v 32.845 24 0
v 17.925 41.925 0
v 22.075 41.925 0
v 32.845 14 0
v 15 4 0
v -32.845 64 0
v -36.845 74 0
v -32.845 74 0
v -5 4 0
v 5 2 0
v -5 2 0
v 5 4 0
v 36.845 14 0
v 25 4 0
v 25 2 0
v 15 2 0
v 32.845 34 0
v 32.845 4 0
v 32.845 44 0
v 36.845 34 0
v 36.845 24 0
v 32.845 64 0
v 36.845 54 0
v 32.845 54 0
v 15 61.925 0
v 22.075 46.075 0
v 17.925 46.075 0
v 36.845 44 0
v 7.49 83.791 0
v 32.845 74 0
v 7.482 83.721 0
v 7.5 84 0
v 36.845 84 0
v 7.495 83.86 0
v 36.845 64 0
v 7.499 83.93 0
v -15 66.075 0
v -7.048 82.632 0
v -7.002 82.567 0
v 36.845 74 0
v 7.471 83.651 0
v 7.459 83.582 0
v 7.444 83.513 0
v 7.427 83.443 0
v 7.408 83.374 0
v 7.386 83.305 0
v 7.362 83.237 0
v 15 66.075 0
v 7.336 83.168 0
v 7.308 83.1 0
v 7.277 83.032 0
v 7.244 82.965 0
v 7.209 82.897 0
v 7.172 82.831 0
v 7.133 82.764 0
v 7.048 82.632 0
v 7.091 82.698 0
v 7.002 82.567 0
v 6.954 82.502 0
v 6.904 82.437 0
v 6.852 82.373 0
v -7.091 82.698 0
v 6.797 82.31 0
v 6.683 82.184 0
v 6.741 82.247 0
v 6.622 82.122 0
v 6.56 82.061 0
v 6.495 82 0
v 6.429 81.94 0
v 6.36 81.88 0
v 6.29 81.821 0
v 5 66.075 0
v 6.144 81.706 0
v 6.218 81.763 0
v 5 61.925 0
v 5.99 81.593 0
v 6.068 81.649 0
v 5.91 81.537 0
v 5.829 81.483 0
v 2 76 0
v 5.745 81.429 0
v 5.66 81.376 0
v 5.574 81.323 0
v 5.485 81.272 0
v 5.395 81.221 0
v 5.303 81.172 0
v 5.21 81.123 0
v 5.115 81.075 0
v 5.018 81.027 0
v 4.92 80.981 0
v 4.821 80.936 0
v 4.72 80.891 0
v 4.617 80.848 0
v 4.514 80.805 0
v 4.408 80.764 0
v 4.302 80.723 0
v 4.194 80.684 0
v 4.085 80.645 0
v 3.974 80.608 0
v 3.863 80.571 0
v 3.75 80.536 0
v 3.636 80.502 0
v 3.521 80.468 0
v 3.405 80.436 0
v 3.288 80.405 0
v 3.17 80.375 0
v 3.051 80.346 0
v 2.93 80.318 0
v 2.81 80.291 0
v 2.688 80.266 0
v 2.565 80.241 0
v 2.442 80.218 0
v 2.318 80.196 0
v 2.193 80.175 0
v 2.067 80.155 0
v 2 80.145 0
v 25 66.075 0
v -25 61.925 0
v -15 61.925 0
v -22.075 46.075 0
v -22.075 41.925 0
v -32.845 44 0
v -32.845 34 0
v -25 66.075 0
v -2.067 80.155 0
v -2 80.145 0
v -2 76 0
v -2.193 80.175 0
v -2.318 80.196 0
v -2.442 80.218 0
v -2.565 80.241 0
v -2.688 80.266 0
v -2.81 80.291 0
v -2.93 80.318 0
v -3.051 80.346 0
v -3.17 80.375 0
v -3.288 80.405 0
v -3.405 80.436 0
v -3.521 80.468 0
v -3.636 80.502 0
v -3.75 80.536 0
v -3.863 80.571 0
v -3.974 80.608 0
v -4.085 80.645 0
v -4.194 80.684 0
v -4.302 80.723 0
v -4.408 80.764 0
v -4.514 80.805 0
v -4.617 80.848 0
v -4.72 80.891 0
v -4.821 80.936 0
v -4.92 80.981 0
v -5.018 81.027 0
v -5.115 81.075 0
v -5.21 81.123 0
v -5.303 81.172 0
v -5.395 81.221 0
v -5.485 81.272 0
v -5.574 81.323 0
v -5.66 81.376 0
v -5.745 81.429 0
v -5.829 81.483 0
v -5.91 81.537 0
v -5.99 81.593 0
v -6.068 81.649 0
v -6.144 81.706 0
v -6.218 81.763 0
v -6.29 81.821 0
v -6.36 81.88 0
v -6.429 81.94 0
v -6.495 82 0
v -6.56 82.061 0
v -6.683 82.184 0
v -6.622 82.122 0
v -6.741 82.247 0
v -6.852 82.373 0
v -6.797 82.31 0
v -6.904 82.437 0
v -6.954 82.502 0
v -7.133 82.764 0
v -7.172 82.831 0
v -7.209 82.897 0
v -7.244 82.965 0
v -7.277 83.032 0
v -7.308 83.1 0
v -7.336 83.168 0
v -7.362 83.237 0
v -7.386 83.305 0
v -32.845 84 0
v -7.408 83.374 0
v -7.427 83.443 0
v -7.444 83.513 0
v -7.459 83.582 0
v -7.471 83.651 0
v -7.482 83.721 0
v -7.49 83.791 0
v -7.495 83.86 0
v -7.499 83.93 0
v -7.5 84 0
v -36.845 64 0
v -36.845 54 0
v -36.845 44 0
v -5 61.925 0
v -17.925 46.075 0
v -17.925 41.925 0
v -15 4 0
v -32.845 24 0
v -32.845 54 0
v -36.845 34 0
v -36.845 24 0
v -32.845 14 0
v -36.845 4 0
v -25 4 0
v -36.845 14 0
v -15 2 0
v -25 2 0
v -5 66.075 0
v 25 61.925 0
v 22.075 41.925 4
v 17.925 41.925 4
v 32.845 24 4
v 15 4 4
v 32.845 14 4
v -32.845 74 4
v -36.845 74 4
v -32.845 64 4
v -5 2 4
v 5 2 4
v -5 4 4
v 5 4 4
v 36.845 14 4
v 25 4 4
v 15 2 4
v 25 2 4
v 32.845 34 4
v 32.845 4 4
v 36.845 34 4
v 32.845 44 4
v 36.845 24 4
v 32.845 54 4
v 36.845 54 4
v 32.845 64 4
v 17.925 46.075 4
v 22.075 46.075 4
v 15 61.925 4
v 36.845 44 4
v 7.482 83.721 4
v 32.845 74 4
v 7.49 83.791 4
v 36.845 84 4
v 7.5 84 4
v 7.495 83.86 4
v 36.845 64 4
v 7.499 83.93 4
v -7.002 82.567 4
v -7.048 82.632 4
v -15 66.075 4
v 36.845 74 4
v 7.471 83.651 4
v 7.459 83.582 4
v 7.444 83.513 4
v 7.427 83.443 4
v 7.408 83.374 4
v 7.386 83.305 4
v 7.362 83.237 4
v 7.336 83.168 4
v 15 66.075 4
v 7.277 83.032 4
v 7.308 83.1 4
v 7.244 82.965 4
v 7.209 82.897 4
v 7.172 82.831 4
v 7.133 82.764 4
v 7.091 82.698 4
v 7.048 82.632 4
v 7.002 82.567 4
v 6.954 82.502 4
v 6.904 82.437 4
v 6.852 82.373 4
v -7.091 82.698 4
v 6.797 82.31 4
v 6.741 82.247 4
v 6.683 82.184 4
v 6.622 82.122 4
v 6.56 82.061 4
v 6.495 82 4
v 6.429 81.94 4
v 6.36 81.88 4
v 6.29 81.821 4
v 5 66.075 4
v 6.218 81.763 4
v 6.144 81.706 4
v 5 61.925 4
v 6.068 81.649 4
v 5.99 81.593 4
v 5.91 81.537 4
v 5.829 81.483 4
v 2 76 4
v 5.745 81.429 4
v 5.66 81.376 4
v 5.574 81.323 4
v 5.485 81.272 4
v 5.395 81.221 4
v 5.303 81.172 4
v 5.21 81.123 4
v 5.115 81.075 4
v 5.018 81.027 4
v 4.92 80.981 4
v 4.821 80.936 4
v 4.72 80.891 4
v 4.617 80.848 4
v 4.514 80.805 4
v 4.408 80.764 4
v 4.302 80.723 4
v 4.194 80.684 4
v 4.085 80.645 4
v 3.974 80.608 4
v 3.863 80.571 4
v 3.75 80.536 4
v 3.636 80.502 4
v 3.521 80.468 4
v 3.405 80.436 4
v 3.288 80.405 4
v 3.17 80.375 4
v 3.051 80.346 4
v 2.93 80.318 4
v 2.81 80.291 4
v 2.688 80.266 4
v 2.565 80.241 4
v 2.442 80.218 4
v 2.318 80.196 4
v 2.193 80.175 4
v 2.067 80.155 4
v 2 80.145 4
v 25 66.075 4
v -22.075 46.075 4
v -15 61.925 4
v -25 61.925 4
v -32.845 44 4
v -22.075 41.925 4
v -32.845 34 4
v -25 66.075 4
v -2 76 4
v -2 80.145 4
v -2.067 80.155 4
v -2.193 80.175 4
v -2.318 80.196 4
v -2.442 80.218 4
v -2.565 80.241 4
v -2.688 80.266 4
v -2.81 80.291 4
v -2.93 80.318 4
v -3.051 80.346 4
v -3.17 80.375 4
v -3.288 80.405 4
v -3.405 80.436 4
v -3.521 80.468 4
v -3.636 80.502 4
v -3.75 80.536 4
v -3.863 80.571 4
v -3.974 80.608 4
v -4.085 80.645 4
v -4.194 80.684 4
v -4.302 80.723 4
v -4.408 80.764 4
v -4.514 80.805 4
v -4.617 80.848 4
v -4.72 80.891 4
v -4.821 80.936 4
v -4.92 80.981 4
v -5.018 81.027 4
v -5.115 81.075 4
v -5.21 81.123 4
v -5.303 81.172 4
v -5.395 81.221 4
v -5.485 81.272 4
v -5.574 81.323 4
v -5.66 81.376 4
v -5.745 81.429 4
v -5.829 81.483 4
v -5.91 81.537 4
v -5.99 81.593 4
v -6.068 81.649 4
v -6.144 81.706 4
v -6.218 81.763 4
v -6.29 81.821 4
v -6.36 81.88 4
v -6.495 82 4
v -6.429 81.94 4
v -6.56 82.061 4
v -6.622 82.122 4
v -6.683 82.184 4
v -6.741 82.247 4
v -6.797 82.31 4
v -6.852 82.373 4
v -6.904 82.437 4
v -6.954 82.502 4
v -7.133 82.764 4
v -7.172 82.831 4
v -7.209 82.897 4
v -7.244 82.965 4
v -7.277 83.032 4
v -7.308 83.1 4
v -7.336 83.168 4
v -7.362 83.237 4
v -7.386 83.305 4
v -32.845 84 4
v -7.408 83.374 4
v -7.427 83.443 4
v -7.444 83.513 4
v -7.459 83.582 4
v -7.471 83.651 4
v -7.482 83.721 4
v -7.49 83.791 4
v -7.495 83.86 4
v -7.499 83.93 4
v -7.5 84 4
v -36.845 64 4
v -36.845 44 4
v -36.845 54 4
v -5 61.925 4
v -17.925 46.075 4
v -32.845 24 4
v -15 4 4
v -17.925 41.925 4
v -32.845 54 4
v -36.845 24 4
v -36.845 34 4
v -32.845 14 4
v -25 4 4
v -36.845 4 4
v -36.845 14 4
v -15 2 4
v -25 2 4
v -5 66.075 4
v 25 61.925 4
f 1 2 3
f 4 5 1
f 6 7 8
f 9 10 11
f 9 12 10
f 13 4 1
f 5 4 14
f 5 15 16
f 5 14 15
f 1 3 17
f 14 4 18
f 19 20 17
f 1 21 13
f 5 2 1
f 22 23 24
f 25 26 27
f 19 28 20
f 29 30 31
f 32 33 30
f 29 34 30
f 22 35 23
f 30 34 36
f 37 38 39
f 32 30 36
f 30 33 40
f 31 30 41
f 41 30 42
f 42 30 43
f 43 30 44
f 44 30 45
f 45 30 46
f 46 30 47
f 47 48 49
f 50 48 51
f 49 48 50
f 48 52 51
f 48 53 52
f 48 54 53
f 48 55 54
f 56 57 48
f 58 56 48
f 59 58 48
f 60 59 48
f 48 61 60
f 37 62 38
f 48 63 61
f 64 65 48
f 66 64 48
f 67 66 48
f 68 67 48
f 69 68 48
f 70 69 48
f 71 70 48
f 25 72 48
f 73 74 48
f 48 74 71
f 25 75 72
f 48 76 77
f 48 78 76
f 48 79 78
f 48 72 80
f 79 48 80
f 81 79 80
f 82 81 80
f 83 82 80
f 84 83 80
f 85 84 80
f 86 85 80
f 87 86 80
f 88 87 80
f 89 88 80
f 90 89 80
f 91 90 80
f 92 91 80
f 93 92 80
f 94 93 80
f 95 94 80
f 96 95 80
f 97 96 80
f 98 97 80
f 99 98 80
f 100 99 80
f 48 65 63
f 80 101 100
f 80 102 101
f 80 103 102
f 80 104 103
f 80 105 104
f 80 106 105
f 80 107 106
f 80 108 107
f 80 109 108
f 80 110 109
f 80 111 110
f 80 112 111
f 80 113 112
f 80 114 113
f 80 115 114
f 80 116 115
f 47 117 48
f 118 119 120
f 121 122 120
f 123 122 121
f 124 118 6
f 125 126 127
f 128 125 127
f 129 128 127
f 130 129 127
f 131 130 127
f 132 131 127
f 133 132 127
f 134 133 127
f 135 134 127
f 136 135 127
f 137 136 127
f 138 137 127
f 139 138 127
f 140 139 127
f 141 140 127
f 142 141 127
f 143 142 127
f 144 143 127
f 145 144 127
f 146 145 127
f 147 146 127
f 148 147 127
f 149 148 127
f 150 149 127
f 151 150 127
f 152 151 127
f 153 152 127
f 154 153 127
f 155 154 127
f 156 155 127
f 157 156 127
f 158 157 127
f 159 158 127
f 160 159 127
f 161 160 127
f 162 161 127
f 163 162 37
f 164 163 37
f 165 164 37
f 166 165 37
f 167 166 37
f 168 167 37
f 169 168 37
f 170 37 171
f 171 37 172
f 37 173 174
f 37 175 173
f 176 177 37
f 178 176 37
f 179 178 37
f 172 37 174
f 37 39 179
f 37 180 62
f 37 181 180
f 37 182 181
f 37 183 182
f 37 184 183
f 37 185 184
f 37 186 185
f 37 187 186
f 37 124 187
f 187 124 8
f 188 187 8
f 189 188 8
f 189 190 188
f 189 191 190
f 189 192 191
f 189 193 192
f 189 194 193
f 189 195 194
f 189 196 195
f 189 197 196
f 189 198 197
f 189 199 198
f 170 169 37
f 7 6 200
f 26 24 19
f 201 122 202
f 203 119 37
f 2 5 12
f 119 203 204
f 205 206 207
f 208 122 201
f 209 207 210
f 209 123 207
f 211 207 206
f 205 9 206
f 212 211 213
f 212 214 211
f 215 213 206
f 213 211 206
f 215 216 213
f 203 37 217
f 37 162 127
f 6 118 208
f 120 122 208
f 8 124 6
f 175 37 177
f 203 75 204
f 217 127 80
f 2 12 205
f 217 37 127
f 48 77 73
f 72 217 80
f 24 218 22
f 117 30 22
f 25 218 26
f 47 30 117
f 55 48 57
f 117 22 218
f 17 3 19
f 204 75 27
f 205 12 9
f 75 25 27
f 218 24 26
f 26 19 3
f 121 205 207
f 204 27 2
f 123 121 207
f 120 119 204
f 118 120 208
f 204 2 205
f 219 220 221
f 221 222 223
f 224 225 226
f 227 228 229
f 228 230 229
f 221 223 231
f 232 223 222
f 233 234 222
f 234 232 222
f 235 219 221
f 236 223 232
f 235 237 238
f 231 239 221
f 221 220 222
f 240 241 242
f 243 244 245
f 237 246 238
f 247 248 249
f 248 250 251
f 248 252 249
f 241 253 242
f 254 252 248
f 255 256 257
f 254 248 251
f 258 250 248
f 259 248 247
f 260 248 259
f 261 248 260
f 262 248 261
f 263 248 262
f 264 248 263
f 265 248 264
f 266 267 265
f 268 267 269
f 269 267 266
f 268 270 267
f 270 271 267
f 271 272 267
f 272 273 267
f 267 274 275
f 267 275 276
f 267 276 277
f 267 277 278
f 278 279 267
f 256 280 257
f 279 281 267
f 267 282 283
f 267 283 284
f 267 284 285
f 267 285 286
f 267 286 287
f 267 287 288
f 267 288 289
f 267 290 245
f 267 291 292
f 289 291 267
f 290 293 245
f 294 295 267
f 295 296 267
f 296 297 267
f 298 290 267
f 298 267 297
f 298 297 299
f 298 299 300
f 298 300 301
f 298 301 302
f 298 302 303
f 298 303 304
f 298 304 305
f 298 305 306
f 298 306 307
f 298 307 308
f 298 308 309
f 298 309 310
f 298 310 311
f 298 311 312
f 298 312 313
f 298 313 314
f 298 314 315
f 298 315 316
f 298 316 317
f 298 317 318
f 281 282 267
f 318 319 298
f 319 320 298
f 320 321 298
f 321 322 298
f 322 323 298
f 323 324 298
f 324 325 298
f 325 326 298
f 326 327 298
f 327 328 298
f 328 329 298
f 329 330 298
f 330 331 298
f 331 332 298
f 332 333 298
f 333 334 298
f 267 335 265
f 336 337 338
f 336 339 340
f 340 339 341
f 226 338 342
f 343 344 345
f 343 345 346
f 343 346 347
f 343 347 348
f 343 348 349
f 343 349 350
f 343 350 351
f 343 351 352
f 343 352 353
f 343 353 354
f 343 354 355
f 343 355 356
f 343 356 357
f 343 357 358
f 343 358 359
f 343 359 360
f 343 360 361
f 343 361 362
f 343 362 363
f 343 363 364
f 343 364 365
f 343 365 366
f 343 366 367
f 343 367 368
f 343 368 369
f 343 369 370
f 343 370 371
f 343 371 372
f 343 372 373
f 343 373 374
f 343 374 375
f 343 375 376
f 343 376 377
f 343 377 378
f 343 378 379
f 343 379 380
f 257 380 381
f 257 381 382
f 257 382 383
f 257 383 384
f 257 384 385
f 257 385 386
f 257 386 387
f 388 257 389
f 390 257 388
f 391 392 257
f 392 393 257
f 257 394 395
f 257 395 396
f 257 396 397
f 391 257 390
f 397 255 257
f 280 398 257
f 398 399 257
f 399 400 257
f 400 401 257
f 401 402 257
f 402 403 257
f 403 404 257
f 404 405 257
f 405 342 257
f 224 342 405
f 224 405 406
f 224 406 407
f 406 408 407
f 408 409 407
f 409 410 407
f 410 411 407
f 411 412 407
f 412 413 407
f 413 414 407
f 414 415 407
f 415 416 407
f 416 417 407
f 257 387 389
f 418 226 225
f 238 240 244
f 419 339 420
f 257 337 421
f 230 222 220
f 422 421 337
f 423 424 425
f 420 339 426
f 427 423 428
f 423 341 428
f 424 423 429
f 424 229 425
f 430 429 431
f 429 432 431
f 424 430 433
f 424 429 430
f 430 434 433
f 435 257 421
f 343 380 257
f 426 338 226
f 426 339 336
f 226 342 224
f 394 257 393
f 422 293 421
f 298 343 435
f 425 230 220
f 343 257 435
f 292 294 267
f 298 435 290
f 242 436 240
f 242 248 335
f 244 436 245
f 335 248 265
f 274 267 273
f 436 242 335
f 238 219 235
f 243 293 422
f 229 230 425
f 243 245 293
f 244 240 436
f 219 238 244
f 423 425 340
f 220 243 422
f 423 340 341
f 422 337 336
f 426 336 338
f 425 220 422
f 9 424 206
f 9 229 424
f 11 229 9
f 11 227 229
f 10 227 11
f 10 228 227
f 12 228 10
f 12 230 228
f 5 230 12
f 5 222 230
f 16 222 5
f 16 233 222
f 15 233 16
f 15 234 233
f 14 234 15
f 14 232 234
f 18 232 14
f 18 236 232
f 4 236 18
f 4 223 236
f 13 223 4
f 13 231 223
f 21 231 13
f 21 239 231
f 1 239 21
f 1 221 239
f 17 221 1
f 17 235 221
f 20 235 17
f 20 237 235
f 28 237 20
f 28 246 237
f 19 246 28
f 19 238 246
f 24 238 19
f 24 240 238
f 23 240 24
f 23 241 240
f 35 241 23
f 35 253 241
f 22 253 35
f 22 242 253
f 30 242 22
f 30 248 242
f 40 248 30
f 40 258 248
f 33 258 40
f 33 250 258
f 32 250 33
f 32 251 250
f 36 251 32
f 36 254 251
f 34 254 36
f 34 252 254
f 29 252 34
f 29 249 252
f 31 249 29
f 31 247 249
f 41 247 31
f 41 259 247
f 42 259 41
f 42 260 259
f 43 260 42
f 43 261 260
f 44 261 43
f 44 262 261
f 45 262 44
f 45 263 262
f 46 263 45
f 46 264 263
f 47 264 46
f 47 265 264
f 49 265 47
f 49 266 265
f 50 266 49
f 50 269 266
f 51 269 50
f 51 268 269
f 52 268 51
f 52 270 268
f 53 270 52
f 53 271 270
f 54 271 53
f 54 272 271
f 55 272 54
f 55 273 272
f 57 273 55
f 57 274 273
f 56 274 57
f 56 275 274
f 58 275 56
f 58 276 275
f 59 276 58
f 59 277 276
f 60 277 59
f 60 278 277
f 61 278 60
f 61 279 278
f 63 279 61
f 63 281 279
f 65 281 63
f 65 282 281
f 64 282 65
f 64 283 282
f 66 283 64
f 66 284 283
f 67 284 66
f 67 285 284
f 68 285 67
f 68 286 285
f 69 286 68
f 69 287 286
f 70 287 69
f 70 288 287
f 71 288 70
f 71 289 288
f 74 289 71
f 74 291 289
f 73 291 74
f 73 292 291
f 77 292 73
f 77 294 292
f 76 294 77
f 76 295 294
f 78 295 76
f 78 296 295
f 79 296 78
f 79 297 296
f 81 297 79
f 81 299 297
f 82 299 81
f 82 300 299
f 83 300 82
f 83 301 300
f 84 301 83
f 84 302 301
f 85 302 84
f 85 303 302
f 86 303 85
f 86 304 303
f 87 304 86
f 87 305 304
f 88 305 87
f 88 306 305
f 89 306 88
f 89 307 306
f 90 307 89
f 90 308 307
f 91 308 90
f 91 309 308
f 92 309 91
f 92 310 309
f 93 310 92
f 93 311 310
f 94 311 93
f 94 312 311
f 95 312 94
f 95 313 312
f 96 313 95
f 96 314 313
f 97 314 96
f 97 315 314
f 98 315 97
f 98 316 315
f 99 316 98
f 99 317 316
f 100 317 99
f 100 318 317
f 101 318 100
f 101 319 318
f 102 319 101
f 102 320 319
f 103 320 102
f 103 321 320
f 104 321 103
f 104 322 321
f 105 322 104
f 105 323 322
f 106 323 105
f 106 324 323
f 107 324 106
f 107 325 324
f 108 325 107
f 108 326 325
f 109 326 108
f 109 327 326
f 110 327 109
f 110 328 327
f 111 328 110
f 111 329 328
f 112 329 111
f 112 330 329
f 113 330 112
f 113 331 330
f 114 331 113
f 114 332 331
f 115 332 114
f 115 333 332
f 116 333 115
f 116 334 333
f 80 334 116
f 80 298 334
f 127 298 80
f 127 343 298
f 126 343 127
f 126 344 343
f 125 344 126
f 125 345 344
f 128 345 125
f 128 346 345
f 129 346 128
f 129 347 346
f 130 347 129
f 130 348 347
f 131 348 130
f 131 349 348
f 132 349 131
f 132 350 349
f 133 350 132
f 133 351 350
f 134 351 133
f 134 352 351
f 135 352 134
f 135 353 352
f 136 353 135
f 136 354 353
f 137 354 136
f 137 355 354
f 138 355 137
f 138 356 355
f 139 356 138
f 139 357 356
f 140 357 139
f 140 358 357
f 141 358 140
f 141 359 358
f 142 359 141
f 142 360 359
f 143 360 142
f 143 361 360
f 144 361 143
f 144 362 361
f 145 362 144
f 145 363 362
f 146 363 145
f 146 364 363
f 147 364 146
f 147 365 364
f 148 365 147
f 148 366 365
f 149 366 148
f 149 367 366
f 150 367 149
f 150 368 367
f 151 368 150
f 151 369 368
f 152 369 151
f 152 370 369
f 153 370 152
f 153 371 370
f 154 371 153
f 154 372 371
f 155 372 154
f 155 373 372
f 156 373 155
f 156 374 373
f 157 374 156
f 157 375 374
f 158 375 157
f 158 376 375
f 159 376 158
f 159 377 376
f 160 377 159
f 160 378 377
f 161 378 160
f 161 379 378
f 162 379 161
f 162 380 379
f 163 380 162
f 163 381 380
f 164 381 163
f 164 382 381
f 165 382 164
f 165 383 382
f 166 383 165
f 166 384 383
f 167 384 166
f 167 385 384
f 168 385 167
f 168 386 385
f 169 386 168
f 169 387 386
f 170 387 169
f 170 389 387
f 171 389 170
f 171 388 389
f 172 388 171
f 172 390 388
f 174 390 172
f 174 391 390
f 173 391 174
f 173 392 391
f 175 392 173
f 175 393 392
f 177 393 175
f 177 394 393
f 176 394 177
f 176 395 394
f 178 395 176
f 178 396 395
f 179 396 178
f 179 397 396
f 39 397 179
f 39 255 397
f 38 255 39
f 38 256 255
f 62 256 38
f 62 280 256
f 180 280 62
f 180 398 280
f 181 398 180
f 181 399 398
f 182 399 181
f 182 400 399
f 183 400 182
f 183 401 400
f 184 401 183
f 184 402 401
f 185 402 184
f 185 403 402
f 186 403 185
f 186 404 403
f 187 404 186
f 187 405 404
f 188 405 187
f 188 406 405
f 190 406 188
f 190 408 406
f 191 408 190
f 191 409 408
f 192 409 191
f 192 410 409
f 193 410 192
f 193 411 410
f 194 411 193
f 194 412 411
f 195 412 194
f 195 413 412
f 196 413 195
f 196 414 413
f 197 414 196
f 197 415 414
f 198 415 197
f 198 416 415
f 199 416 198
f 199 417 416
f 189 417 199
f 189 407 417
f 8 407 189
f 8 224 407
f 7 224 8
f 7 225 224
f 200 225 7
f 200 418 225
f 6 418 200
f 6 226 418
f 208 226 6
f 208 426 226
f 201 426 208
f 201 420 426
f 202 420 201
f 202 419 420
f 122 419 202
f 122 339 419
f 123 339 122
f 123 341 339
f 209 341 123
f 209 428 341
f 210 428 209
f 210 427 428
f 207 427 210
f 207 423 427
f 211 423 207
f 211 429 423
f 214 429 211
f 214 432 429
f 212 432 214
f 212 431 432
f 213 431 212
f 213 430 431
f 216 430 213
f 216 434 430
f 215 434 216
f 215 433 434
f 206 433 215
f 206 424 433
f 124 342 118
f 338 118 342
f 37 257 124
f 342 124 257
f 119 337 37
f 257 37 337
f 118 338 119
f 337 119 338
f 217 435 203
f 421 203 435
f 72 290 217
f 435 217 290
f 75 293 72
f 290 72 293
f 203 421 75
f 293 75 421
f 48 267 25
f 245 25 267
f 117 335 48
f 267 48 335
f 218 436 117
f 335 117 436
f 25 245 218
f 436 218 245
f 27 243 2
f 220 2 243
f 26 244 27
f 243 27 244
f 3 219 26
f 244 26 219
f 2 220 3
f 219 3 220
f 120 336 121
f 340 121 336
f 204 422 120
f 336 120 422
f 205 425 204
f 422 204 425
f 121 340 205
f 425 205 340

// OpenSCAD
/* 
 * Stackenlichten-Files I: The top plate
 *
 * kellertuer, 2017-02-19
 * int2k, 2018-01-01 Added tolerances to the Centerfittings
 *
 * todo:
 * rewrite (nice!) recursion with tolerances also added on sides
 */

/*
 * Variables, all Data in mm
 */
wW = 4;    // Thickness/Width of wood
mW = 4;    //                 of a Magnet-Cube
tol = .15;  // Tolerances for the Fitting with the centerpiece
fW = 2;    // Thickness of the front plastic plate
sL = 80;   // sidelength of a triangle
bD = 80;   // Depth of a box (depth w.r.t. frontview)
fC = 3;    // number of fingers in the triangle (odd)
fD = 4;    // number on fingers downwards (even)
eW = 15; //ellipseWidth (longer arc)
// don't change these values
nC = 2*fC+2; //number of Divisions, due to 2fC+1 segments anC one segment that split in the corners
nD = 2*fD;
shortenSide = wW/tan(60)+wW/sin(90);
// concat with shfted rotated versions... bottom left right

//Generate one side

translate([0,wW]) rotate(a=0,v=[1,0,0])
SLside();

module SLside() {
    linear_extrude(height=wW, twist=0)
    difference() {
    midFC = (fC + 1)/2;
    SidePointLine = concat(genSide(0,[0,0], shortenSide,shortenSide+wW,fW),
    genDepth(0,[sL/2-shortenSide/2-wW,0],[0,0],wW),
    [[sL/2-shortenSide/2,-bD],[-sL/2+shortenSide/2+wW,-bD]],
    -genDepth(0,[sL/2-shortenSide/2-wW,bD],[0,0],wW)   );
  rotate(a=180,v=[1,0,0])
  polygon(points=SidePointLine);
  // minus...
  translate([2*sL/nC,bD/2])
    square(size = [mW+tol,mW+tol], center = true);
  translate([-2*sL/nC,bD/2])
    square(size = [mW+tol,mW+tol], center = true);
  for (i = [1:fC]) {
    translate([-sL/2+2*i*sL/nC,3*bD/4])
      square([sL/nC,wW+tol], center = true);
  };
    translate([0,bD,0]) scale([eW,2*wW])circle(d=1,$fn=360,center=true);
    translate([0,bD-wW]) square([wW,2*wW],center=true);
}}


/*
 * Helping Functions - Generate one side of the triangle recursion olé olé
 */
function genSide(a=0,v=[0,0],sLe=0,sRi=0,h=wW) = generateSide([rotM(a)*[-(sL-sLe)/2,0]+v],0,a,v,sLe,sRi,h);   
//Recursively generate fC toothes
function generateSide(pL,i,a,v,sLe,sRi,h) = (i==fC) ? concat(pL,[rotM(a)*[(sL-sRi)/2,0]+v])
    : generateSide(concat(pL,[
        rotM(a)*[-sL/2+(2*i+1.5)*sL/nC,0]+v, rotM(a)*[-sL/2+(2*i+1.5)*sL/nC,h]+v,
        rotM(a)*[-sL/2+(2*i+2.5)*sL/nC,h]+v, rotM(a)*[-sL/2+(2*i+2.5)*sL/nC,0]+v]),i+1,a,v,sLe,sRi,h);
function genDepth(a=0,v=[0,0],start=[0,0],h=wW) = generateDepth([start+v],0,a,v,h,start);
function generateDepth(pL,i,a,v,h,start) = (i==fD) ? pL
    : generateDepth(concat(pL,[
        rotM(a)*(start+[0,-(2*i+1)*bD/nD])+v, rotM(a)*(start+[h,-(2*i+1)*bD/nD])+v,
        rotM(a)*(start+[h,-(2*i+2)*bD/nD])+v, rotM(a)*(start+[0,-(2*i+2)*bD/nD])+v
        ]),i+1,a,v,h,start);
/*
 * Small Helpers
 */
function rotM(a) = [[cos(a),sin(a)],[-sin(a),cos(a)]];
